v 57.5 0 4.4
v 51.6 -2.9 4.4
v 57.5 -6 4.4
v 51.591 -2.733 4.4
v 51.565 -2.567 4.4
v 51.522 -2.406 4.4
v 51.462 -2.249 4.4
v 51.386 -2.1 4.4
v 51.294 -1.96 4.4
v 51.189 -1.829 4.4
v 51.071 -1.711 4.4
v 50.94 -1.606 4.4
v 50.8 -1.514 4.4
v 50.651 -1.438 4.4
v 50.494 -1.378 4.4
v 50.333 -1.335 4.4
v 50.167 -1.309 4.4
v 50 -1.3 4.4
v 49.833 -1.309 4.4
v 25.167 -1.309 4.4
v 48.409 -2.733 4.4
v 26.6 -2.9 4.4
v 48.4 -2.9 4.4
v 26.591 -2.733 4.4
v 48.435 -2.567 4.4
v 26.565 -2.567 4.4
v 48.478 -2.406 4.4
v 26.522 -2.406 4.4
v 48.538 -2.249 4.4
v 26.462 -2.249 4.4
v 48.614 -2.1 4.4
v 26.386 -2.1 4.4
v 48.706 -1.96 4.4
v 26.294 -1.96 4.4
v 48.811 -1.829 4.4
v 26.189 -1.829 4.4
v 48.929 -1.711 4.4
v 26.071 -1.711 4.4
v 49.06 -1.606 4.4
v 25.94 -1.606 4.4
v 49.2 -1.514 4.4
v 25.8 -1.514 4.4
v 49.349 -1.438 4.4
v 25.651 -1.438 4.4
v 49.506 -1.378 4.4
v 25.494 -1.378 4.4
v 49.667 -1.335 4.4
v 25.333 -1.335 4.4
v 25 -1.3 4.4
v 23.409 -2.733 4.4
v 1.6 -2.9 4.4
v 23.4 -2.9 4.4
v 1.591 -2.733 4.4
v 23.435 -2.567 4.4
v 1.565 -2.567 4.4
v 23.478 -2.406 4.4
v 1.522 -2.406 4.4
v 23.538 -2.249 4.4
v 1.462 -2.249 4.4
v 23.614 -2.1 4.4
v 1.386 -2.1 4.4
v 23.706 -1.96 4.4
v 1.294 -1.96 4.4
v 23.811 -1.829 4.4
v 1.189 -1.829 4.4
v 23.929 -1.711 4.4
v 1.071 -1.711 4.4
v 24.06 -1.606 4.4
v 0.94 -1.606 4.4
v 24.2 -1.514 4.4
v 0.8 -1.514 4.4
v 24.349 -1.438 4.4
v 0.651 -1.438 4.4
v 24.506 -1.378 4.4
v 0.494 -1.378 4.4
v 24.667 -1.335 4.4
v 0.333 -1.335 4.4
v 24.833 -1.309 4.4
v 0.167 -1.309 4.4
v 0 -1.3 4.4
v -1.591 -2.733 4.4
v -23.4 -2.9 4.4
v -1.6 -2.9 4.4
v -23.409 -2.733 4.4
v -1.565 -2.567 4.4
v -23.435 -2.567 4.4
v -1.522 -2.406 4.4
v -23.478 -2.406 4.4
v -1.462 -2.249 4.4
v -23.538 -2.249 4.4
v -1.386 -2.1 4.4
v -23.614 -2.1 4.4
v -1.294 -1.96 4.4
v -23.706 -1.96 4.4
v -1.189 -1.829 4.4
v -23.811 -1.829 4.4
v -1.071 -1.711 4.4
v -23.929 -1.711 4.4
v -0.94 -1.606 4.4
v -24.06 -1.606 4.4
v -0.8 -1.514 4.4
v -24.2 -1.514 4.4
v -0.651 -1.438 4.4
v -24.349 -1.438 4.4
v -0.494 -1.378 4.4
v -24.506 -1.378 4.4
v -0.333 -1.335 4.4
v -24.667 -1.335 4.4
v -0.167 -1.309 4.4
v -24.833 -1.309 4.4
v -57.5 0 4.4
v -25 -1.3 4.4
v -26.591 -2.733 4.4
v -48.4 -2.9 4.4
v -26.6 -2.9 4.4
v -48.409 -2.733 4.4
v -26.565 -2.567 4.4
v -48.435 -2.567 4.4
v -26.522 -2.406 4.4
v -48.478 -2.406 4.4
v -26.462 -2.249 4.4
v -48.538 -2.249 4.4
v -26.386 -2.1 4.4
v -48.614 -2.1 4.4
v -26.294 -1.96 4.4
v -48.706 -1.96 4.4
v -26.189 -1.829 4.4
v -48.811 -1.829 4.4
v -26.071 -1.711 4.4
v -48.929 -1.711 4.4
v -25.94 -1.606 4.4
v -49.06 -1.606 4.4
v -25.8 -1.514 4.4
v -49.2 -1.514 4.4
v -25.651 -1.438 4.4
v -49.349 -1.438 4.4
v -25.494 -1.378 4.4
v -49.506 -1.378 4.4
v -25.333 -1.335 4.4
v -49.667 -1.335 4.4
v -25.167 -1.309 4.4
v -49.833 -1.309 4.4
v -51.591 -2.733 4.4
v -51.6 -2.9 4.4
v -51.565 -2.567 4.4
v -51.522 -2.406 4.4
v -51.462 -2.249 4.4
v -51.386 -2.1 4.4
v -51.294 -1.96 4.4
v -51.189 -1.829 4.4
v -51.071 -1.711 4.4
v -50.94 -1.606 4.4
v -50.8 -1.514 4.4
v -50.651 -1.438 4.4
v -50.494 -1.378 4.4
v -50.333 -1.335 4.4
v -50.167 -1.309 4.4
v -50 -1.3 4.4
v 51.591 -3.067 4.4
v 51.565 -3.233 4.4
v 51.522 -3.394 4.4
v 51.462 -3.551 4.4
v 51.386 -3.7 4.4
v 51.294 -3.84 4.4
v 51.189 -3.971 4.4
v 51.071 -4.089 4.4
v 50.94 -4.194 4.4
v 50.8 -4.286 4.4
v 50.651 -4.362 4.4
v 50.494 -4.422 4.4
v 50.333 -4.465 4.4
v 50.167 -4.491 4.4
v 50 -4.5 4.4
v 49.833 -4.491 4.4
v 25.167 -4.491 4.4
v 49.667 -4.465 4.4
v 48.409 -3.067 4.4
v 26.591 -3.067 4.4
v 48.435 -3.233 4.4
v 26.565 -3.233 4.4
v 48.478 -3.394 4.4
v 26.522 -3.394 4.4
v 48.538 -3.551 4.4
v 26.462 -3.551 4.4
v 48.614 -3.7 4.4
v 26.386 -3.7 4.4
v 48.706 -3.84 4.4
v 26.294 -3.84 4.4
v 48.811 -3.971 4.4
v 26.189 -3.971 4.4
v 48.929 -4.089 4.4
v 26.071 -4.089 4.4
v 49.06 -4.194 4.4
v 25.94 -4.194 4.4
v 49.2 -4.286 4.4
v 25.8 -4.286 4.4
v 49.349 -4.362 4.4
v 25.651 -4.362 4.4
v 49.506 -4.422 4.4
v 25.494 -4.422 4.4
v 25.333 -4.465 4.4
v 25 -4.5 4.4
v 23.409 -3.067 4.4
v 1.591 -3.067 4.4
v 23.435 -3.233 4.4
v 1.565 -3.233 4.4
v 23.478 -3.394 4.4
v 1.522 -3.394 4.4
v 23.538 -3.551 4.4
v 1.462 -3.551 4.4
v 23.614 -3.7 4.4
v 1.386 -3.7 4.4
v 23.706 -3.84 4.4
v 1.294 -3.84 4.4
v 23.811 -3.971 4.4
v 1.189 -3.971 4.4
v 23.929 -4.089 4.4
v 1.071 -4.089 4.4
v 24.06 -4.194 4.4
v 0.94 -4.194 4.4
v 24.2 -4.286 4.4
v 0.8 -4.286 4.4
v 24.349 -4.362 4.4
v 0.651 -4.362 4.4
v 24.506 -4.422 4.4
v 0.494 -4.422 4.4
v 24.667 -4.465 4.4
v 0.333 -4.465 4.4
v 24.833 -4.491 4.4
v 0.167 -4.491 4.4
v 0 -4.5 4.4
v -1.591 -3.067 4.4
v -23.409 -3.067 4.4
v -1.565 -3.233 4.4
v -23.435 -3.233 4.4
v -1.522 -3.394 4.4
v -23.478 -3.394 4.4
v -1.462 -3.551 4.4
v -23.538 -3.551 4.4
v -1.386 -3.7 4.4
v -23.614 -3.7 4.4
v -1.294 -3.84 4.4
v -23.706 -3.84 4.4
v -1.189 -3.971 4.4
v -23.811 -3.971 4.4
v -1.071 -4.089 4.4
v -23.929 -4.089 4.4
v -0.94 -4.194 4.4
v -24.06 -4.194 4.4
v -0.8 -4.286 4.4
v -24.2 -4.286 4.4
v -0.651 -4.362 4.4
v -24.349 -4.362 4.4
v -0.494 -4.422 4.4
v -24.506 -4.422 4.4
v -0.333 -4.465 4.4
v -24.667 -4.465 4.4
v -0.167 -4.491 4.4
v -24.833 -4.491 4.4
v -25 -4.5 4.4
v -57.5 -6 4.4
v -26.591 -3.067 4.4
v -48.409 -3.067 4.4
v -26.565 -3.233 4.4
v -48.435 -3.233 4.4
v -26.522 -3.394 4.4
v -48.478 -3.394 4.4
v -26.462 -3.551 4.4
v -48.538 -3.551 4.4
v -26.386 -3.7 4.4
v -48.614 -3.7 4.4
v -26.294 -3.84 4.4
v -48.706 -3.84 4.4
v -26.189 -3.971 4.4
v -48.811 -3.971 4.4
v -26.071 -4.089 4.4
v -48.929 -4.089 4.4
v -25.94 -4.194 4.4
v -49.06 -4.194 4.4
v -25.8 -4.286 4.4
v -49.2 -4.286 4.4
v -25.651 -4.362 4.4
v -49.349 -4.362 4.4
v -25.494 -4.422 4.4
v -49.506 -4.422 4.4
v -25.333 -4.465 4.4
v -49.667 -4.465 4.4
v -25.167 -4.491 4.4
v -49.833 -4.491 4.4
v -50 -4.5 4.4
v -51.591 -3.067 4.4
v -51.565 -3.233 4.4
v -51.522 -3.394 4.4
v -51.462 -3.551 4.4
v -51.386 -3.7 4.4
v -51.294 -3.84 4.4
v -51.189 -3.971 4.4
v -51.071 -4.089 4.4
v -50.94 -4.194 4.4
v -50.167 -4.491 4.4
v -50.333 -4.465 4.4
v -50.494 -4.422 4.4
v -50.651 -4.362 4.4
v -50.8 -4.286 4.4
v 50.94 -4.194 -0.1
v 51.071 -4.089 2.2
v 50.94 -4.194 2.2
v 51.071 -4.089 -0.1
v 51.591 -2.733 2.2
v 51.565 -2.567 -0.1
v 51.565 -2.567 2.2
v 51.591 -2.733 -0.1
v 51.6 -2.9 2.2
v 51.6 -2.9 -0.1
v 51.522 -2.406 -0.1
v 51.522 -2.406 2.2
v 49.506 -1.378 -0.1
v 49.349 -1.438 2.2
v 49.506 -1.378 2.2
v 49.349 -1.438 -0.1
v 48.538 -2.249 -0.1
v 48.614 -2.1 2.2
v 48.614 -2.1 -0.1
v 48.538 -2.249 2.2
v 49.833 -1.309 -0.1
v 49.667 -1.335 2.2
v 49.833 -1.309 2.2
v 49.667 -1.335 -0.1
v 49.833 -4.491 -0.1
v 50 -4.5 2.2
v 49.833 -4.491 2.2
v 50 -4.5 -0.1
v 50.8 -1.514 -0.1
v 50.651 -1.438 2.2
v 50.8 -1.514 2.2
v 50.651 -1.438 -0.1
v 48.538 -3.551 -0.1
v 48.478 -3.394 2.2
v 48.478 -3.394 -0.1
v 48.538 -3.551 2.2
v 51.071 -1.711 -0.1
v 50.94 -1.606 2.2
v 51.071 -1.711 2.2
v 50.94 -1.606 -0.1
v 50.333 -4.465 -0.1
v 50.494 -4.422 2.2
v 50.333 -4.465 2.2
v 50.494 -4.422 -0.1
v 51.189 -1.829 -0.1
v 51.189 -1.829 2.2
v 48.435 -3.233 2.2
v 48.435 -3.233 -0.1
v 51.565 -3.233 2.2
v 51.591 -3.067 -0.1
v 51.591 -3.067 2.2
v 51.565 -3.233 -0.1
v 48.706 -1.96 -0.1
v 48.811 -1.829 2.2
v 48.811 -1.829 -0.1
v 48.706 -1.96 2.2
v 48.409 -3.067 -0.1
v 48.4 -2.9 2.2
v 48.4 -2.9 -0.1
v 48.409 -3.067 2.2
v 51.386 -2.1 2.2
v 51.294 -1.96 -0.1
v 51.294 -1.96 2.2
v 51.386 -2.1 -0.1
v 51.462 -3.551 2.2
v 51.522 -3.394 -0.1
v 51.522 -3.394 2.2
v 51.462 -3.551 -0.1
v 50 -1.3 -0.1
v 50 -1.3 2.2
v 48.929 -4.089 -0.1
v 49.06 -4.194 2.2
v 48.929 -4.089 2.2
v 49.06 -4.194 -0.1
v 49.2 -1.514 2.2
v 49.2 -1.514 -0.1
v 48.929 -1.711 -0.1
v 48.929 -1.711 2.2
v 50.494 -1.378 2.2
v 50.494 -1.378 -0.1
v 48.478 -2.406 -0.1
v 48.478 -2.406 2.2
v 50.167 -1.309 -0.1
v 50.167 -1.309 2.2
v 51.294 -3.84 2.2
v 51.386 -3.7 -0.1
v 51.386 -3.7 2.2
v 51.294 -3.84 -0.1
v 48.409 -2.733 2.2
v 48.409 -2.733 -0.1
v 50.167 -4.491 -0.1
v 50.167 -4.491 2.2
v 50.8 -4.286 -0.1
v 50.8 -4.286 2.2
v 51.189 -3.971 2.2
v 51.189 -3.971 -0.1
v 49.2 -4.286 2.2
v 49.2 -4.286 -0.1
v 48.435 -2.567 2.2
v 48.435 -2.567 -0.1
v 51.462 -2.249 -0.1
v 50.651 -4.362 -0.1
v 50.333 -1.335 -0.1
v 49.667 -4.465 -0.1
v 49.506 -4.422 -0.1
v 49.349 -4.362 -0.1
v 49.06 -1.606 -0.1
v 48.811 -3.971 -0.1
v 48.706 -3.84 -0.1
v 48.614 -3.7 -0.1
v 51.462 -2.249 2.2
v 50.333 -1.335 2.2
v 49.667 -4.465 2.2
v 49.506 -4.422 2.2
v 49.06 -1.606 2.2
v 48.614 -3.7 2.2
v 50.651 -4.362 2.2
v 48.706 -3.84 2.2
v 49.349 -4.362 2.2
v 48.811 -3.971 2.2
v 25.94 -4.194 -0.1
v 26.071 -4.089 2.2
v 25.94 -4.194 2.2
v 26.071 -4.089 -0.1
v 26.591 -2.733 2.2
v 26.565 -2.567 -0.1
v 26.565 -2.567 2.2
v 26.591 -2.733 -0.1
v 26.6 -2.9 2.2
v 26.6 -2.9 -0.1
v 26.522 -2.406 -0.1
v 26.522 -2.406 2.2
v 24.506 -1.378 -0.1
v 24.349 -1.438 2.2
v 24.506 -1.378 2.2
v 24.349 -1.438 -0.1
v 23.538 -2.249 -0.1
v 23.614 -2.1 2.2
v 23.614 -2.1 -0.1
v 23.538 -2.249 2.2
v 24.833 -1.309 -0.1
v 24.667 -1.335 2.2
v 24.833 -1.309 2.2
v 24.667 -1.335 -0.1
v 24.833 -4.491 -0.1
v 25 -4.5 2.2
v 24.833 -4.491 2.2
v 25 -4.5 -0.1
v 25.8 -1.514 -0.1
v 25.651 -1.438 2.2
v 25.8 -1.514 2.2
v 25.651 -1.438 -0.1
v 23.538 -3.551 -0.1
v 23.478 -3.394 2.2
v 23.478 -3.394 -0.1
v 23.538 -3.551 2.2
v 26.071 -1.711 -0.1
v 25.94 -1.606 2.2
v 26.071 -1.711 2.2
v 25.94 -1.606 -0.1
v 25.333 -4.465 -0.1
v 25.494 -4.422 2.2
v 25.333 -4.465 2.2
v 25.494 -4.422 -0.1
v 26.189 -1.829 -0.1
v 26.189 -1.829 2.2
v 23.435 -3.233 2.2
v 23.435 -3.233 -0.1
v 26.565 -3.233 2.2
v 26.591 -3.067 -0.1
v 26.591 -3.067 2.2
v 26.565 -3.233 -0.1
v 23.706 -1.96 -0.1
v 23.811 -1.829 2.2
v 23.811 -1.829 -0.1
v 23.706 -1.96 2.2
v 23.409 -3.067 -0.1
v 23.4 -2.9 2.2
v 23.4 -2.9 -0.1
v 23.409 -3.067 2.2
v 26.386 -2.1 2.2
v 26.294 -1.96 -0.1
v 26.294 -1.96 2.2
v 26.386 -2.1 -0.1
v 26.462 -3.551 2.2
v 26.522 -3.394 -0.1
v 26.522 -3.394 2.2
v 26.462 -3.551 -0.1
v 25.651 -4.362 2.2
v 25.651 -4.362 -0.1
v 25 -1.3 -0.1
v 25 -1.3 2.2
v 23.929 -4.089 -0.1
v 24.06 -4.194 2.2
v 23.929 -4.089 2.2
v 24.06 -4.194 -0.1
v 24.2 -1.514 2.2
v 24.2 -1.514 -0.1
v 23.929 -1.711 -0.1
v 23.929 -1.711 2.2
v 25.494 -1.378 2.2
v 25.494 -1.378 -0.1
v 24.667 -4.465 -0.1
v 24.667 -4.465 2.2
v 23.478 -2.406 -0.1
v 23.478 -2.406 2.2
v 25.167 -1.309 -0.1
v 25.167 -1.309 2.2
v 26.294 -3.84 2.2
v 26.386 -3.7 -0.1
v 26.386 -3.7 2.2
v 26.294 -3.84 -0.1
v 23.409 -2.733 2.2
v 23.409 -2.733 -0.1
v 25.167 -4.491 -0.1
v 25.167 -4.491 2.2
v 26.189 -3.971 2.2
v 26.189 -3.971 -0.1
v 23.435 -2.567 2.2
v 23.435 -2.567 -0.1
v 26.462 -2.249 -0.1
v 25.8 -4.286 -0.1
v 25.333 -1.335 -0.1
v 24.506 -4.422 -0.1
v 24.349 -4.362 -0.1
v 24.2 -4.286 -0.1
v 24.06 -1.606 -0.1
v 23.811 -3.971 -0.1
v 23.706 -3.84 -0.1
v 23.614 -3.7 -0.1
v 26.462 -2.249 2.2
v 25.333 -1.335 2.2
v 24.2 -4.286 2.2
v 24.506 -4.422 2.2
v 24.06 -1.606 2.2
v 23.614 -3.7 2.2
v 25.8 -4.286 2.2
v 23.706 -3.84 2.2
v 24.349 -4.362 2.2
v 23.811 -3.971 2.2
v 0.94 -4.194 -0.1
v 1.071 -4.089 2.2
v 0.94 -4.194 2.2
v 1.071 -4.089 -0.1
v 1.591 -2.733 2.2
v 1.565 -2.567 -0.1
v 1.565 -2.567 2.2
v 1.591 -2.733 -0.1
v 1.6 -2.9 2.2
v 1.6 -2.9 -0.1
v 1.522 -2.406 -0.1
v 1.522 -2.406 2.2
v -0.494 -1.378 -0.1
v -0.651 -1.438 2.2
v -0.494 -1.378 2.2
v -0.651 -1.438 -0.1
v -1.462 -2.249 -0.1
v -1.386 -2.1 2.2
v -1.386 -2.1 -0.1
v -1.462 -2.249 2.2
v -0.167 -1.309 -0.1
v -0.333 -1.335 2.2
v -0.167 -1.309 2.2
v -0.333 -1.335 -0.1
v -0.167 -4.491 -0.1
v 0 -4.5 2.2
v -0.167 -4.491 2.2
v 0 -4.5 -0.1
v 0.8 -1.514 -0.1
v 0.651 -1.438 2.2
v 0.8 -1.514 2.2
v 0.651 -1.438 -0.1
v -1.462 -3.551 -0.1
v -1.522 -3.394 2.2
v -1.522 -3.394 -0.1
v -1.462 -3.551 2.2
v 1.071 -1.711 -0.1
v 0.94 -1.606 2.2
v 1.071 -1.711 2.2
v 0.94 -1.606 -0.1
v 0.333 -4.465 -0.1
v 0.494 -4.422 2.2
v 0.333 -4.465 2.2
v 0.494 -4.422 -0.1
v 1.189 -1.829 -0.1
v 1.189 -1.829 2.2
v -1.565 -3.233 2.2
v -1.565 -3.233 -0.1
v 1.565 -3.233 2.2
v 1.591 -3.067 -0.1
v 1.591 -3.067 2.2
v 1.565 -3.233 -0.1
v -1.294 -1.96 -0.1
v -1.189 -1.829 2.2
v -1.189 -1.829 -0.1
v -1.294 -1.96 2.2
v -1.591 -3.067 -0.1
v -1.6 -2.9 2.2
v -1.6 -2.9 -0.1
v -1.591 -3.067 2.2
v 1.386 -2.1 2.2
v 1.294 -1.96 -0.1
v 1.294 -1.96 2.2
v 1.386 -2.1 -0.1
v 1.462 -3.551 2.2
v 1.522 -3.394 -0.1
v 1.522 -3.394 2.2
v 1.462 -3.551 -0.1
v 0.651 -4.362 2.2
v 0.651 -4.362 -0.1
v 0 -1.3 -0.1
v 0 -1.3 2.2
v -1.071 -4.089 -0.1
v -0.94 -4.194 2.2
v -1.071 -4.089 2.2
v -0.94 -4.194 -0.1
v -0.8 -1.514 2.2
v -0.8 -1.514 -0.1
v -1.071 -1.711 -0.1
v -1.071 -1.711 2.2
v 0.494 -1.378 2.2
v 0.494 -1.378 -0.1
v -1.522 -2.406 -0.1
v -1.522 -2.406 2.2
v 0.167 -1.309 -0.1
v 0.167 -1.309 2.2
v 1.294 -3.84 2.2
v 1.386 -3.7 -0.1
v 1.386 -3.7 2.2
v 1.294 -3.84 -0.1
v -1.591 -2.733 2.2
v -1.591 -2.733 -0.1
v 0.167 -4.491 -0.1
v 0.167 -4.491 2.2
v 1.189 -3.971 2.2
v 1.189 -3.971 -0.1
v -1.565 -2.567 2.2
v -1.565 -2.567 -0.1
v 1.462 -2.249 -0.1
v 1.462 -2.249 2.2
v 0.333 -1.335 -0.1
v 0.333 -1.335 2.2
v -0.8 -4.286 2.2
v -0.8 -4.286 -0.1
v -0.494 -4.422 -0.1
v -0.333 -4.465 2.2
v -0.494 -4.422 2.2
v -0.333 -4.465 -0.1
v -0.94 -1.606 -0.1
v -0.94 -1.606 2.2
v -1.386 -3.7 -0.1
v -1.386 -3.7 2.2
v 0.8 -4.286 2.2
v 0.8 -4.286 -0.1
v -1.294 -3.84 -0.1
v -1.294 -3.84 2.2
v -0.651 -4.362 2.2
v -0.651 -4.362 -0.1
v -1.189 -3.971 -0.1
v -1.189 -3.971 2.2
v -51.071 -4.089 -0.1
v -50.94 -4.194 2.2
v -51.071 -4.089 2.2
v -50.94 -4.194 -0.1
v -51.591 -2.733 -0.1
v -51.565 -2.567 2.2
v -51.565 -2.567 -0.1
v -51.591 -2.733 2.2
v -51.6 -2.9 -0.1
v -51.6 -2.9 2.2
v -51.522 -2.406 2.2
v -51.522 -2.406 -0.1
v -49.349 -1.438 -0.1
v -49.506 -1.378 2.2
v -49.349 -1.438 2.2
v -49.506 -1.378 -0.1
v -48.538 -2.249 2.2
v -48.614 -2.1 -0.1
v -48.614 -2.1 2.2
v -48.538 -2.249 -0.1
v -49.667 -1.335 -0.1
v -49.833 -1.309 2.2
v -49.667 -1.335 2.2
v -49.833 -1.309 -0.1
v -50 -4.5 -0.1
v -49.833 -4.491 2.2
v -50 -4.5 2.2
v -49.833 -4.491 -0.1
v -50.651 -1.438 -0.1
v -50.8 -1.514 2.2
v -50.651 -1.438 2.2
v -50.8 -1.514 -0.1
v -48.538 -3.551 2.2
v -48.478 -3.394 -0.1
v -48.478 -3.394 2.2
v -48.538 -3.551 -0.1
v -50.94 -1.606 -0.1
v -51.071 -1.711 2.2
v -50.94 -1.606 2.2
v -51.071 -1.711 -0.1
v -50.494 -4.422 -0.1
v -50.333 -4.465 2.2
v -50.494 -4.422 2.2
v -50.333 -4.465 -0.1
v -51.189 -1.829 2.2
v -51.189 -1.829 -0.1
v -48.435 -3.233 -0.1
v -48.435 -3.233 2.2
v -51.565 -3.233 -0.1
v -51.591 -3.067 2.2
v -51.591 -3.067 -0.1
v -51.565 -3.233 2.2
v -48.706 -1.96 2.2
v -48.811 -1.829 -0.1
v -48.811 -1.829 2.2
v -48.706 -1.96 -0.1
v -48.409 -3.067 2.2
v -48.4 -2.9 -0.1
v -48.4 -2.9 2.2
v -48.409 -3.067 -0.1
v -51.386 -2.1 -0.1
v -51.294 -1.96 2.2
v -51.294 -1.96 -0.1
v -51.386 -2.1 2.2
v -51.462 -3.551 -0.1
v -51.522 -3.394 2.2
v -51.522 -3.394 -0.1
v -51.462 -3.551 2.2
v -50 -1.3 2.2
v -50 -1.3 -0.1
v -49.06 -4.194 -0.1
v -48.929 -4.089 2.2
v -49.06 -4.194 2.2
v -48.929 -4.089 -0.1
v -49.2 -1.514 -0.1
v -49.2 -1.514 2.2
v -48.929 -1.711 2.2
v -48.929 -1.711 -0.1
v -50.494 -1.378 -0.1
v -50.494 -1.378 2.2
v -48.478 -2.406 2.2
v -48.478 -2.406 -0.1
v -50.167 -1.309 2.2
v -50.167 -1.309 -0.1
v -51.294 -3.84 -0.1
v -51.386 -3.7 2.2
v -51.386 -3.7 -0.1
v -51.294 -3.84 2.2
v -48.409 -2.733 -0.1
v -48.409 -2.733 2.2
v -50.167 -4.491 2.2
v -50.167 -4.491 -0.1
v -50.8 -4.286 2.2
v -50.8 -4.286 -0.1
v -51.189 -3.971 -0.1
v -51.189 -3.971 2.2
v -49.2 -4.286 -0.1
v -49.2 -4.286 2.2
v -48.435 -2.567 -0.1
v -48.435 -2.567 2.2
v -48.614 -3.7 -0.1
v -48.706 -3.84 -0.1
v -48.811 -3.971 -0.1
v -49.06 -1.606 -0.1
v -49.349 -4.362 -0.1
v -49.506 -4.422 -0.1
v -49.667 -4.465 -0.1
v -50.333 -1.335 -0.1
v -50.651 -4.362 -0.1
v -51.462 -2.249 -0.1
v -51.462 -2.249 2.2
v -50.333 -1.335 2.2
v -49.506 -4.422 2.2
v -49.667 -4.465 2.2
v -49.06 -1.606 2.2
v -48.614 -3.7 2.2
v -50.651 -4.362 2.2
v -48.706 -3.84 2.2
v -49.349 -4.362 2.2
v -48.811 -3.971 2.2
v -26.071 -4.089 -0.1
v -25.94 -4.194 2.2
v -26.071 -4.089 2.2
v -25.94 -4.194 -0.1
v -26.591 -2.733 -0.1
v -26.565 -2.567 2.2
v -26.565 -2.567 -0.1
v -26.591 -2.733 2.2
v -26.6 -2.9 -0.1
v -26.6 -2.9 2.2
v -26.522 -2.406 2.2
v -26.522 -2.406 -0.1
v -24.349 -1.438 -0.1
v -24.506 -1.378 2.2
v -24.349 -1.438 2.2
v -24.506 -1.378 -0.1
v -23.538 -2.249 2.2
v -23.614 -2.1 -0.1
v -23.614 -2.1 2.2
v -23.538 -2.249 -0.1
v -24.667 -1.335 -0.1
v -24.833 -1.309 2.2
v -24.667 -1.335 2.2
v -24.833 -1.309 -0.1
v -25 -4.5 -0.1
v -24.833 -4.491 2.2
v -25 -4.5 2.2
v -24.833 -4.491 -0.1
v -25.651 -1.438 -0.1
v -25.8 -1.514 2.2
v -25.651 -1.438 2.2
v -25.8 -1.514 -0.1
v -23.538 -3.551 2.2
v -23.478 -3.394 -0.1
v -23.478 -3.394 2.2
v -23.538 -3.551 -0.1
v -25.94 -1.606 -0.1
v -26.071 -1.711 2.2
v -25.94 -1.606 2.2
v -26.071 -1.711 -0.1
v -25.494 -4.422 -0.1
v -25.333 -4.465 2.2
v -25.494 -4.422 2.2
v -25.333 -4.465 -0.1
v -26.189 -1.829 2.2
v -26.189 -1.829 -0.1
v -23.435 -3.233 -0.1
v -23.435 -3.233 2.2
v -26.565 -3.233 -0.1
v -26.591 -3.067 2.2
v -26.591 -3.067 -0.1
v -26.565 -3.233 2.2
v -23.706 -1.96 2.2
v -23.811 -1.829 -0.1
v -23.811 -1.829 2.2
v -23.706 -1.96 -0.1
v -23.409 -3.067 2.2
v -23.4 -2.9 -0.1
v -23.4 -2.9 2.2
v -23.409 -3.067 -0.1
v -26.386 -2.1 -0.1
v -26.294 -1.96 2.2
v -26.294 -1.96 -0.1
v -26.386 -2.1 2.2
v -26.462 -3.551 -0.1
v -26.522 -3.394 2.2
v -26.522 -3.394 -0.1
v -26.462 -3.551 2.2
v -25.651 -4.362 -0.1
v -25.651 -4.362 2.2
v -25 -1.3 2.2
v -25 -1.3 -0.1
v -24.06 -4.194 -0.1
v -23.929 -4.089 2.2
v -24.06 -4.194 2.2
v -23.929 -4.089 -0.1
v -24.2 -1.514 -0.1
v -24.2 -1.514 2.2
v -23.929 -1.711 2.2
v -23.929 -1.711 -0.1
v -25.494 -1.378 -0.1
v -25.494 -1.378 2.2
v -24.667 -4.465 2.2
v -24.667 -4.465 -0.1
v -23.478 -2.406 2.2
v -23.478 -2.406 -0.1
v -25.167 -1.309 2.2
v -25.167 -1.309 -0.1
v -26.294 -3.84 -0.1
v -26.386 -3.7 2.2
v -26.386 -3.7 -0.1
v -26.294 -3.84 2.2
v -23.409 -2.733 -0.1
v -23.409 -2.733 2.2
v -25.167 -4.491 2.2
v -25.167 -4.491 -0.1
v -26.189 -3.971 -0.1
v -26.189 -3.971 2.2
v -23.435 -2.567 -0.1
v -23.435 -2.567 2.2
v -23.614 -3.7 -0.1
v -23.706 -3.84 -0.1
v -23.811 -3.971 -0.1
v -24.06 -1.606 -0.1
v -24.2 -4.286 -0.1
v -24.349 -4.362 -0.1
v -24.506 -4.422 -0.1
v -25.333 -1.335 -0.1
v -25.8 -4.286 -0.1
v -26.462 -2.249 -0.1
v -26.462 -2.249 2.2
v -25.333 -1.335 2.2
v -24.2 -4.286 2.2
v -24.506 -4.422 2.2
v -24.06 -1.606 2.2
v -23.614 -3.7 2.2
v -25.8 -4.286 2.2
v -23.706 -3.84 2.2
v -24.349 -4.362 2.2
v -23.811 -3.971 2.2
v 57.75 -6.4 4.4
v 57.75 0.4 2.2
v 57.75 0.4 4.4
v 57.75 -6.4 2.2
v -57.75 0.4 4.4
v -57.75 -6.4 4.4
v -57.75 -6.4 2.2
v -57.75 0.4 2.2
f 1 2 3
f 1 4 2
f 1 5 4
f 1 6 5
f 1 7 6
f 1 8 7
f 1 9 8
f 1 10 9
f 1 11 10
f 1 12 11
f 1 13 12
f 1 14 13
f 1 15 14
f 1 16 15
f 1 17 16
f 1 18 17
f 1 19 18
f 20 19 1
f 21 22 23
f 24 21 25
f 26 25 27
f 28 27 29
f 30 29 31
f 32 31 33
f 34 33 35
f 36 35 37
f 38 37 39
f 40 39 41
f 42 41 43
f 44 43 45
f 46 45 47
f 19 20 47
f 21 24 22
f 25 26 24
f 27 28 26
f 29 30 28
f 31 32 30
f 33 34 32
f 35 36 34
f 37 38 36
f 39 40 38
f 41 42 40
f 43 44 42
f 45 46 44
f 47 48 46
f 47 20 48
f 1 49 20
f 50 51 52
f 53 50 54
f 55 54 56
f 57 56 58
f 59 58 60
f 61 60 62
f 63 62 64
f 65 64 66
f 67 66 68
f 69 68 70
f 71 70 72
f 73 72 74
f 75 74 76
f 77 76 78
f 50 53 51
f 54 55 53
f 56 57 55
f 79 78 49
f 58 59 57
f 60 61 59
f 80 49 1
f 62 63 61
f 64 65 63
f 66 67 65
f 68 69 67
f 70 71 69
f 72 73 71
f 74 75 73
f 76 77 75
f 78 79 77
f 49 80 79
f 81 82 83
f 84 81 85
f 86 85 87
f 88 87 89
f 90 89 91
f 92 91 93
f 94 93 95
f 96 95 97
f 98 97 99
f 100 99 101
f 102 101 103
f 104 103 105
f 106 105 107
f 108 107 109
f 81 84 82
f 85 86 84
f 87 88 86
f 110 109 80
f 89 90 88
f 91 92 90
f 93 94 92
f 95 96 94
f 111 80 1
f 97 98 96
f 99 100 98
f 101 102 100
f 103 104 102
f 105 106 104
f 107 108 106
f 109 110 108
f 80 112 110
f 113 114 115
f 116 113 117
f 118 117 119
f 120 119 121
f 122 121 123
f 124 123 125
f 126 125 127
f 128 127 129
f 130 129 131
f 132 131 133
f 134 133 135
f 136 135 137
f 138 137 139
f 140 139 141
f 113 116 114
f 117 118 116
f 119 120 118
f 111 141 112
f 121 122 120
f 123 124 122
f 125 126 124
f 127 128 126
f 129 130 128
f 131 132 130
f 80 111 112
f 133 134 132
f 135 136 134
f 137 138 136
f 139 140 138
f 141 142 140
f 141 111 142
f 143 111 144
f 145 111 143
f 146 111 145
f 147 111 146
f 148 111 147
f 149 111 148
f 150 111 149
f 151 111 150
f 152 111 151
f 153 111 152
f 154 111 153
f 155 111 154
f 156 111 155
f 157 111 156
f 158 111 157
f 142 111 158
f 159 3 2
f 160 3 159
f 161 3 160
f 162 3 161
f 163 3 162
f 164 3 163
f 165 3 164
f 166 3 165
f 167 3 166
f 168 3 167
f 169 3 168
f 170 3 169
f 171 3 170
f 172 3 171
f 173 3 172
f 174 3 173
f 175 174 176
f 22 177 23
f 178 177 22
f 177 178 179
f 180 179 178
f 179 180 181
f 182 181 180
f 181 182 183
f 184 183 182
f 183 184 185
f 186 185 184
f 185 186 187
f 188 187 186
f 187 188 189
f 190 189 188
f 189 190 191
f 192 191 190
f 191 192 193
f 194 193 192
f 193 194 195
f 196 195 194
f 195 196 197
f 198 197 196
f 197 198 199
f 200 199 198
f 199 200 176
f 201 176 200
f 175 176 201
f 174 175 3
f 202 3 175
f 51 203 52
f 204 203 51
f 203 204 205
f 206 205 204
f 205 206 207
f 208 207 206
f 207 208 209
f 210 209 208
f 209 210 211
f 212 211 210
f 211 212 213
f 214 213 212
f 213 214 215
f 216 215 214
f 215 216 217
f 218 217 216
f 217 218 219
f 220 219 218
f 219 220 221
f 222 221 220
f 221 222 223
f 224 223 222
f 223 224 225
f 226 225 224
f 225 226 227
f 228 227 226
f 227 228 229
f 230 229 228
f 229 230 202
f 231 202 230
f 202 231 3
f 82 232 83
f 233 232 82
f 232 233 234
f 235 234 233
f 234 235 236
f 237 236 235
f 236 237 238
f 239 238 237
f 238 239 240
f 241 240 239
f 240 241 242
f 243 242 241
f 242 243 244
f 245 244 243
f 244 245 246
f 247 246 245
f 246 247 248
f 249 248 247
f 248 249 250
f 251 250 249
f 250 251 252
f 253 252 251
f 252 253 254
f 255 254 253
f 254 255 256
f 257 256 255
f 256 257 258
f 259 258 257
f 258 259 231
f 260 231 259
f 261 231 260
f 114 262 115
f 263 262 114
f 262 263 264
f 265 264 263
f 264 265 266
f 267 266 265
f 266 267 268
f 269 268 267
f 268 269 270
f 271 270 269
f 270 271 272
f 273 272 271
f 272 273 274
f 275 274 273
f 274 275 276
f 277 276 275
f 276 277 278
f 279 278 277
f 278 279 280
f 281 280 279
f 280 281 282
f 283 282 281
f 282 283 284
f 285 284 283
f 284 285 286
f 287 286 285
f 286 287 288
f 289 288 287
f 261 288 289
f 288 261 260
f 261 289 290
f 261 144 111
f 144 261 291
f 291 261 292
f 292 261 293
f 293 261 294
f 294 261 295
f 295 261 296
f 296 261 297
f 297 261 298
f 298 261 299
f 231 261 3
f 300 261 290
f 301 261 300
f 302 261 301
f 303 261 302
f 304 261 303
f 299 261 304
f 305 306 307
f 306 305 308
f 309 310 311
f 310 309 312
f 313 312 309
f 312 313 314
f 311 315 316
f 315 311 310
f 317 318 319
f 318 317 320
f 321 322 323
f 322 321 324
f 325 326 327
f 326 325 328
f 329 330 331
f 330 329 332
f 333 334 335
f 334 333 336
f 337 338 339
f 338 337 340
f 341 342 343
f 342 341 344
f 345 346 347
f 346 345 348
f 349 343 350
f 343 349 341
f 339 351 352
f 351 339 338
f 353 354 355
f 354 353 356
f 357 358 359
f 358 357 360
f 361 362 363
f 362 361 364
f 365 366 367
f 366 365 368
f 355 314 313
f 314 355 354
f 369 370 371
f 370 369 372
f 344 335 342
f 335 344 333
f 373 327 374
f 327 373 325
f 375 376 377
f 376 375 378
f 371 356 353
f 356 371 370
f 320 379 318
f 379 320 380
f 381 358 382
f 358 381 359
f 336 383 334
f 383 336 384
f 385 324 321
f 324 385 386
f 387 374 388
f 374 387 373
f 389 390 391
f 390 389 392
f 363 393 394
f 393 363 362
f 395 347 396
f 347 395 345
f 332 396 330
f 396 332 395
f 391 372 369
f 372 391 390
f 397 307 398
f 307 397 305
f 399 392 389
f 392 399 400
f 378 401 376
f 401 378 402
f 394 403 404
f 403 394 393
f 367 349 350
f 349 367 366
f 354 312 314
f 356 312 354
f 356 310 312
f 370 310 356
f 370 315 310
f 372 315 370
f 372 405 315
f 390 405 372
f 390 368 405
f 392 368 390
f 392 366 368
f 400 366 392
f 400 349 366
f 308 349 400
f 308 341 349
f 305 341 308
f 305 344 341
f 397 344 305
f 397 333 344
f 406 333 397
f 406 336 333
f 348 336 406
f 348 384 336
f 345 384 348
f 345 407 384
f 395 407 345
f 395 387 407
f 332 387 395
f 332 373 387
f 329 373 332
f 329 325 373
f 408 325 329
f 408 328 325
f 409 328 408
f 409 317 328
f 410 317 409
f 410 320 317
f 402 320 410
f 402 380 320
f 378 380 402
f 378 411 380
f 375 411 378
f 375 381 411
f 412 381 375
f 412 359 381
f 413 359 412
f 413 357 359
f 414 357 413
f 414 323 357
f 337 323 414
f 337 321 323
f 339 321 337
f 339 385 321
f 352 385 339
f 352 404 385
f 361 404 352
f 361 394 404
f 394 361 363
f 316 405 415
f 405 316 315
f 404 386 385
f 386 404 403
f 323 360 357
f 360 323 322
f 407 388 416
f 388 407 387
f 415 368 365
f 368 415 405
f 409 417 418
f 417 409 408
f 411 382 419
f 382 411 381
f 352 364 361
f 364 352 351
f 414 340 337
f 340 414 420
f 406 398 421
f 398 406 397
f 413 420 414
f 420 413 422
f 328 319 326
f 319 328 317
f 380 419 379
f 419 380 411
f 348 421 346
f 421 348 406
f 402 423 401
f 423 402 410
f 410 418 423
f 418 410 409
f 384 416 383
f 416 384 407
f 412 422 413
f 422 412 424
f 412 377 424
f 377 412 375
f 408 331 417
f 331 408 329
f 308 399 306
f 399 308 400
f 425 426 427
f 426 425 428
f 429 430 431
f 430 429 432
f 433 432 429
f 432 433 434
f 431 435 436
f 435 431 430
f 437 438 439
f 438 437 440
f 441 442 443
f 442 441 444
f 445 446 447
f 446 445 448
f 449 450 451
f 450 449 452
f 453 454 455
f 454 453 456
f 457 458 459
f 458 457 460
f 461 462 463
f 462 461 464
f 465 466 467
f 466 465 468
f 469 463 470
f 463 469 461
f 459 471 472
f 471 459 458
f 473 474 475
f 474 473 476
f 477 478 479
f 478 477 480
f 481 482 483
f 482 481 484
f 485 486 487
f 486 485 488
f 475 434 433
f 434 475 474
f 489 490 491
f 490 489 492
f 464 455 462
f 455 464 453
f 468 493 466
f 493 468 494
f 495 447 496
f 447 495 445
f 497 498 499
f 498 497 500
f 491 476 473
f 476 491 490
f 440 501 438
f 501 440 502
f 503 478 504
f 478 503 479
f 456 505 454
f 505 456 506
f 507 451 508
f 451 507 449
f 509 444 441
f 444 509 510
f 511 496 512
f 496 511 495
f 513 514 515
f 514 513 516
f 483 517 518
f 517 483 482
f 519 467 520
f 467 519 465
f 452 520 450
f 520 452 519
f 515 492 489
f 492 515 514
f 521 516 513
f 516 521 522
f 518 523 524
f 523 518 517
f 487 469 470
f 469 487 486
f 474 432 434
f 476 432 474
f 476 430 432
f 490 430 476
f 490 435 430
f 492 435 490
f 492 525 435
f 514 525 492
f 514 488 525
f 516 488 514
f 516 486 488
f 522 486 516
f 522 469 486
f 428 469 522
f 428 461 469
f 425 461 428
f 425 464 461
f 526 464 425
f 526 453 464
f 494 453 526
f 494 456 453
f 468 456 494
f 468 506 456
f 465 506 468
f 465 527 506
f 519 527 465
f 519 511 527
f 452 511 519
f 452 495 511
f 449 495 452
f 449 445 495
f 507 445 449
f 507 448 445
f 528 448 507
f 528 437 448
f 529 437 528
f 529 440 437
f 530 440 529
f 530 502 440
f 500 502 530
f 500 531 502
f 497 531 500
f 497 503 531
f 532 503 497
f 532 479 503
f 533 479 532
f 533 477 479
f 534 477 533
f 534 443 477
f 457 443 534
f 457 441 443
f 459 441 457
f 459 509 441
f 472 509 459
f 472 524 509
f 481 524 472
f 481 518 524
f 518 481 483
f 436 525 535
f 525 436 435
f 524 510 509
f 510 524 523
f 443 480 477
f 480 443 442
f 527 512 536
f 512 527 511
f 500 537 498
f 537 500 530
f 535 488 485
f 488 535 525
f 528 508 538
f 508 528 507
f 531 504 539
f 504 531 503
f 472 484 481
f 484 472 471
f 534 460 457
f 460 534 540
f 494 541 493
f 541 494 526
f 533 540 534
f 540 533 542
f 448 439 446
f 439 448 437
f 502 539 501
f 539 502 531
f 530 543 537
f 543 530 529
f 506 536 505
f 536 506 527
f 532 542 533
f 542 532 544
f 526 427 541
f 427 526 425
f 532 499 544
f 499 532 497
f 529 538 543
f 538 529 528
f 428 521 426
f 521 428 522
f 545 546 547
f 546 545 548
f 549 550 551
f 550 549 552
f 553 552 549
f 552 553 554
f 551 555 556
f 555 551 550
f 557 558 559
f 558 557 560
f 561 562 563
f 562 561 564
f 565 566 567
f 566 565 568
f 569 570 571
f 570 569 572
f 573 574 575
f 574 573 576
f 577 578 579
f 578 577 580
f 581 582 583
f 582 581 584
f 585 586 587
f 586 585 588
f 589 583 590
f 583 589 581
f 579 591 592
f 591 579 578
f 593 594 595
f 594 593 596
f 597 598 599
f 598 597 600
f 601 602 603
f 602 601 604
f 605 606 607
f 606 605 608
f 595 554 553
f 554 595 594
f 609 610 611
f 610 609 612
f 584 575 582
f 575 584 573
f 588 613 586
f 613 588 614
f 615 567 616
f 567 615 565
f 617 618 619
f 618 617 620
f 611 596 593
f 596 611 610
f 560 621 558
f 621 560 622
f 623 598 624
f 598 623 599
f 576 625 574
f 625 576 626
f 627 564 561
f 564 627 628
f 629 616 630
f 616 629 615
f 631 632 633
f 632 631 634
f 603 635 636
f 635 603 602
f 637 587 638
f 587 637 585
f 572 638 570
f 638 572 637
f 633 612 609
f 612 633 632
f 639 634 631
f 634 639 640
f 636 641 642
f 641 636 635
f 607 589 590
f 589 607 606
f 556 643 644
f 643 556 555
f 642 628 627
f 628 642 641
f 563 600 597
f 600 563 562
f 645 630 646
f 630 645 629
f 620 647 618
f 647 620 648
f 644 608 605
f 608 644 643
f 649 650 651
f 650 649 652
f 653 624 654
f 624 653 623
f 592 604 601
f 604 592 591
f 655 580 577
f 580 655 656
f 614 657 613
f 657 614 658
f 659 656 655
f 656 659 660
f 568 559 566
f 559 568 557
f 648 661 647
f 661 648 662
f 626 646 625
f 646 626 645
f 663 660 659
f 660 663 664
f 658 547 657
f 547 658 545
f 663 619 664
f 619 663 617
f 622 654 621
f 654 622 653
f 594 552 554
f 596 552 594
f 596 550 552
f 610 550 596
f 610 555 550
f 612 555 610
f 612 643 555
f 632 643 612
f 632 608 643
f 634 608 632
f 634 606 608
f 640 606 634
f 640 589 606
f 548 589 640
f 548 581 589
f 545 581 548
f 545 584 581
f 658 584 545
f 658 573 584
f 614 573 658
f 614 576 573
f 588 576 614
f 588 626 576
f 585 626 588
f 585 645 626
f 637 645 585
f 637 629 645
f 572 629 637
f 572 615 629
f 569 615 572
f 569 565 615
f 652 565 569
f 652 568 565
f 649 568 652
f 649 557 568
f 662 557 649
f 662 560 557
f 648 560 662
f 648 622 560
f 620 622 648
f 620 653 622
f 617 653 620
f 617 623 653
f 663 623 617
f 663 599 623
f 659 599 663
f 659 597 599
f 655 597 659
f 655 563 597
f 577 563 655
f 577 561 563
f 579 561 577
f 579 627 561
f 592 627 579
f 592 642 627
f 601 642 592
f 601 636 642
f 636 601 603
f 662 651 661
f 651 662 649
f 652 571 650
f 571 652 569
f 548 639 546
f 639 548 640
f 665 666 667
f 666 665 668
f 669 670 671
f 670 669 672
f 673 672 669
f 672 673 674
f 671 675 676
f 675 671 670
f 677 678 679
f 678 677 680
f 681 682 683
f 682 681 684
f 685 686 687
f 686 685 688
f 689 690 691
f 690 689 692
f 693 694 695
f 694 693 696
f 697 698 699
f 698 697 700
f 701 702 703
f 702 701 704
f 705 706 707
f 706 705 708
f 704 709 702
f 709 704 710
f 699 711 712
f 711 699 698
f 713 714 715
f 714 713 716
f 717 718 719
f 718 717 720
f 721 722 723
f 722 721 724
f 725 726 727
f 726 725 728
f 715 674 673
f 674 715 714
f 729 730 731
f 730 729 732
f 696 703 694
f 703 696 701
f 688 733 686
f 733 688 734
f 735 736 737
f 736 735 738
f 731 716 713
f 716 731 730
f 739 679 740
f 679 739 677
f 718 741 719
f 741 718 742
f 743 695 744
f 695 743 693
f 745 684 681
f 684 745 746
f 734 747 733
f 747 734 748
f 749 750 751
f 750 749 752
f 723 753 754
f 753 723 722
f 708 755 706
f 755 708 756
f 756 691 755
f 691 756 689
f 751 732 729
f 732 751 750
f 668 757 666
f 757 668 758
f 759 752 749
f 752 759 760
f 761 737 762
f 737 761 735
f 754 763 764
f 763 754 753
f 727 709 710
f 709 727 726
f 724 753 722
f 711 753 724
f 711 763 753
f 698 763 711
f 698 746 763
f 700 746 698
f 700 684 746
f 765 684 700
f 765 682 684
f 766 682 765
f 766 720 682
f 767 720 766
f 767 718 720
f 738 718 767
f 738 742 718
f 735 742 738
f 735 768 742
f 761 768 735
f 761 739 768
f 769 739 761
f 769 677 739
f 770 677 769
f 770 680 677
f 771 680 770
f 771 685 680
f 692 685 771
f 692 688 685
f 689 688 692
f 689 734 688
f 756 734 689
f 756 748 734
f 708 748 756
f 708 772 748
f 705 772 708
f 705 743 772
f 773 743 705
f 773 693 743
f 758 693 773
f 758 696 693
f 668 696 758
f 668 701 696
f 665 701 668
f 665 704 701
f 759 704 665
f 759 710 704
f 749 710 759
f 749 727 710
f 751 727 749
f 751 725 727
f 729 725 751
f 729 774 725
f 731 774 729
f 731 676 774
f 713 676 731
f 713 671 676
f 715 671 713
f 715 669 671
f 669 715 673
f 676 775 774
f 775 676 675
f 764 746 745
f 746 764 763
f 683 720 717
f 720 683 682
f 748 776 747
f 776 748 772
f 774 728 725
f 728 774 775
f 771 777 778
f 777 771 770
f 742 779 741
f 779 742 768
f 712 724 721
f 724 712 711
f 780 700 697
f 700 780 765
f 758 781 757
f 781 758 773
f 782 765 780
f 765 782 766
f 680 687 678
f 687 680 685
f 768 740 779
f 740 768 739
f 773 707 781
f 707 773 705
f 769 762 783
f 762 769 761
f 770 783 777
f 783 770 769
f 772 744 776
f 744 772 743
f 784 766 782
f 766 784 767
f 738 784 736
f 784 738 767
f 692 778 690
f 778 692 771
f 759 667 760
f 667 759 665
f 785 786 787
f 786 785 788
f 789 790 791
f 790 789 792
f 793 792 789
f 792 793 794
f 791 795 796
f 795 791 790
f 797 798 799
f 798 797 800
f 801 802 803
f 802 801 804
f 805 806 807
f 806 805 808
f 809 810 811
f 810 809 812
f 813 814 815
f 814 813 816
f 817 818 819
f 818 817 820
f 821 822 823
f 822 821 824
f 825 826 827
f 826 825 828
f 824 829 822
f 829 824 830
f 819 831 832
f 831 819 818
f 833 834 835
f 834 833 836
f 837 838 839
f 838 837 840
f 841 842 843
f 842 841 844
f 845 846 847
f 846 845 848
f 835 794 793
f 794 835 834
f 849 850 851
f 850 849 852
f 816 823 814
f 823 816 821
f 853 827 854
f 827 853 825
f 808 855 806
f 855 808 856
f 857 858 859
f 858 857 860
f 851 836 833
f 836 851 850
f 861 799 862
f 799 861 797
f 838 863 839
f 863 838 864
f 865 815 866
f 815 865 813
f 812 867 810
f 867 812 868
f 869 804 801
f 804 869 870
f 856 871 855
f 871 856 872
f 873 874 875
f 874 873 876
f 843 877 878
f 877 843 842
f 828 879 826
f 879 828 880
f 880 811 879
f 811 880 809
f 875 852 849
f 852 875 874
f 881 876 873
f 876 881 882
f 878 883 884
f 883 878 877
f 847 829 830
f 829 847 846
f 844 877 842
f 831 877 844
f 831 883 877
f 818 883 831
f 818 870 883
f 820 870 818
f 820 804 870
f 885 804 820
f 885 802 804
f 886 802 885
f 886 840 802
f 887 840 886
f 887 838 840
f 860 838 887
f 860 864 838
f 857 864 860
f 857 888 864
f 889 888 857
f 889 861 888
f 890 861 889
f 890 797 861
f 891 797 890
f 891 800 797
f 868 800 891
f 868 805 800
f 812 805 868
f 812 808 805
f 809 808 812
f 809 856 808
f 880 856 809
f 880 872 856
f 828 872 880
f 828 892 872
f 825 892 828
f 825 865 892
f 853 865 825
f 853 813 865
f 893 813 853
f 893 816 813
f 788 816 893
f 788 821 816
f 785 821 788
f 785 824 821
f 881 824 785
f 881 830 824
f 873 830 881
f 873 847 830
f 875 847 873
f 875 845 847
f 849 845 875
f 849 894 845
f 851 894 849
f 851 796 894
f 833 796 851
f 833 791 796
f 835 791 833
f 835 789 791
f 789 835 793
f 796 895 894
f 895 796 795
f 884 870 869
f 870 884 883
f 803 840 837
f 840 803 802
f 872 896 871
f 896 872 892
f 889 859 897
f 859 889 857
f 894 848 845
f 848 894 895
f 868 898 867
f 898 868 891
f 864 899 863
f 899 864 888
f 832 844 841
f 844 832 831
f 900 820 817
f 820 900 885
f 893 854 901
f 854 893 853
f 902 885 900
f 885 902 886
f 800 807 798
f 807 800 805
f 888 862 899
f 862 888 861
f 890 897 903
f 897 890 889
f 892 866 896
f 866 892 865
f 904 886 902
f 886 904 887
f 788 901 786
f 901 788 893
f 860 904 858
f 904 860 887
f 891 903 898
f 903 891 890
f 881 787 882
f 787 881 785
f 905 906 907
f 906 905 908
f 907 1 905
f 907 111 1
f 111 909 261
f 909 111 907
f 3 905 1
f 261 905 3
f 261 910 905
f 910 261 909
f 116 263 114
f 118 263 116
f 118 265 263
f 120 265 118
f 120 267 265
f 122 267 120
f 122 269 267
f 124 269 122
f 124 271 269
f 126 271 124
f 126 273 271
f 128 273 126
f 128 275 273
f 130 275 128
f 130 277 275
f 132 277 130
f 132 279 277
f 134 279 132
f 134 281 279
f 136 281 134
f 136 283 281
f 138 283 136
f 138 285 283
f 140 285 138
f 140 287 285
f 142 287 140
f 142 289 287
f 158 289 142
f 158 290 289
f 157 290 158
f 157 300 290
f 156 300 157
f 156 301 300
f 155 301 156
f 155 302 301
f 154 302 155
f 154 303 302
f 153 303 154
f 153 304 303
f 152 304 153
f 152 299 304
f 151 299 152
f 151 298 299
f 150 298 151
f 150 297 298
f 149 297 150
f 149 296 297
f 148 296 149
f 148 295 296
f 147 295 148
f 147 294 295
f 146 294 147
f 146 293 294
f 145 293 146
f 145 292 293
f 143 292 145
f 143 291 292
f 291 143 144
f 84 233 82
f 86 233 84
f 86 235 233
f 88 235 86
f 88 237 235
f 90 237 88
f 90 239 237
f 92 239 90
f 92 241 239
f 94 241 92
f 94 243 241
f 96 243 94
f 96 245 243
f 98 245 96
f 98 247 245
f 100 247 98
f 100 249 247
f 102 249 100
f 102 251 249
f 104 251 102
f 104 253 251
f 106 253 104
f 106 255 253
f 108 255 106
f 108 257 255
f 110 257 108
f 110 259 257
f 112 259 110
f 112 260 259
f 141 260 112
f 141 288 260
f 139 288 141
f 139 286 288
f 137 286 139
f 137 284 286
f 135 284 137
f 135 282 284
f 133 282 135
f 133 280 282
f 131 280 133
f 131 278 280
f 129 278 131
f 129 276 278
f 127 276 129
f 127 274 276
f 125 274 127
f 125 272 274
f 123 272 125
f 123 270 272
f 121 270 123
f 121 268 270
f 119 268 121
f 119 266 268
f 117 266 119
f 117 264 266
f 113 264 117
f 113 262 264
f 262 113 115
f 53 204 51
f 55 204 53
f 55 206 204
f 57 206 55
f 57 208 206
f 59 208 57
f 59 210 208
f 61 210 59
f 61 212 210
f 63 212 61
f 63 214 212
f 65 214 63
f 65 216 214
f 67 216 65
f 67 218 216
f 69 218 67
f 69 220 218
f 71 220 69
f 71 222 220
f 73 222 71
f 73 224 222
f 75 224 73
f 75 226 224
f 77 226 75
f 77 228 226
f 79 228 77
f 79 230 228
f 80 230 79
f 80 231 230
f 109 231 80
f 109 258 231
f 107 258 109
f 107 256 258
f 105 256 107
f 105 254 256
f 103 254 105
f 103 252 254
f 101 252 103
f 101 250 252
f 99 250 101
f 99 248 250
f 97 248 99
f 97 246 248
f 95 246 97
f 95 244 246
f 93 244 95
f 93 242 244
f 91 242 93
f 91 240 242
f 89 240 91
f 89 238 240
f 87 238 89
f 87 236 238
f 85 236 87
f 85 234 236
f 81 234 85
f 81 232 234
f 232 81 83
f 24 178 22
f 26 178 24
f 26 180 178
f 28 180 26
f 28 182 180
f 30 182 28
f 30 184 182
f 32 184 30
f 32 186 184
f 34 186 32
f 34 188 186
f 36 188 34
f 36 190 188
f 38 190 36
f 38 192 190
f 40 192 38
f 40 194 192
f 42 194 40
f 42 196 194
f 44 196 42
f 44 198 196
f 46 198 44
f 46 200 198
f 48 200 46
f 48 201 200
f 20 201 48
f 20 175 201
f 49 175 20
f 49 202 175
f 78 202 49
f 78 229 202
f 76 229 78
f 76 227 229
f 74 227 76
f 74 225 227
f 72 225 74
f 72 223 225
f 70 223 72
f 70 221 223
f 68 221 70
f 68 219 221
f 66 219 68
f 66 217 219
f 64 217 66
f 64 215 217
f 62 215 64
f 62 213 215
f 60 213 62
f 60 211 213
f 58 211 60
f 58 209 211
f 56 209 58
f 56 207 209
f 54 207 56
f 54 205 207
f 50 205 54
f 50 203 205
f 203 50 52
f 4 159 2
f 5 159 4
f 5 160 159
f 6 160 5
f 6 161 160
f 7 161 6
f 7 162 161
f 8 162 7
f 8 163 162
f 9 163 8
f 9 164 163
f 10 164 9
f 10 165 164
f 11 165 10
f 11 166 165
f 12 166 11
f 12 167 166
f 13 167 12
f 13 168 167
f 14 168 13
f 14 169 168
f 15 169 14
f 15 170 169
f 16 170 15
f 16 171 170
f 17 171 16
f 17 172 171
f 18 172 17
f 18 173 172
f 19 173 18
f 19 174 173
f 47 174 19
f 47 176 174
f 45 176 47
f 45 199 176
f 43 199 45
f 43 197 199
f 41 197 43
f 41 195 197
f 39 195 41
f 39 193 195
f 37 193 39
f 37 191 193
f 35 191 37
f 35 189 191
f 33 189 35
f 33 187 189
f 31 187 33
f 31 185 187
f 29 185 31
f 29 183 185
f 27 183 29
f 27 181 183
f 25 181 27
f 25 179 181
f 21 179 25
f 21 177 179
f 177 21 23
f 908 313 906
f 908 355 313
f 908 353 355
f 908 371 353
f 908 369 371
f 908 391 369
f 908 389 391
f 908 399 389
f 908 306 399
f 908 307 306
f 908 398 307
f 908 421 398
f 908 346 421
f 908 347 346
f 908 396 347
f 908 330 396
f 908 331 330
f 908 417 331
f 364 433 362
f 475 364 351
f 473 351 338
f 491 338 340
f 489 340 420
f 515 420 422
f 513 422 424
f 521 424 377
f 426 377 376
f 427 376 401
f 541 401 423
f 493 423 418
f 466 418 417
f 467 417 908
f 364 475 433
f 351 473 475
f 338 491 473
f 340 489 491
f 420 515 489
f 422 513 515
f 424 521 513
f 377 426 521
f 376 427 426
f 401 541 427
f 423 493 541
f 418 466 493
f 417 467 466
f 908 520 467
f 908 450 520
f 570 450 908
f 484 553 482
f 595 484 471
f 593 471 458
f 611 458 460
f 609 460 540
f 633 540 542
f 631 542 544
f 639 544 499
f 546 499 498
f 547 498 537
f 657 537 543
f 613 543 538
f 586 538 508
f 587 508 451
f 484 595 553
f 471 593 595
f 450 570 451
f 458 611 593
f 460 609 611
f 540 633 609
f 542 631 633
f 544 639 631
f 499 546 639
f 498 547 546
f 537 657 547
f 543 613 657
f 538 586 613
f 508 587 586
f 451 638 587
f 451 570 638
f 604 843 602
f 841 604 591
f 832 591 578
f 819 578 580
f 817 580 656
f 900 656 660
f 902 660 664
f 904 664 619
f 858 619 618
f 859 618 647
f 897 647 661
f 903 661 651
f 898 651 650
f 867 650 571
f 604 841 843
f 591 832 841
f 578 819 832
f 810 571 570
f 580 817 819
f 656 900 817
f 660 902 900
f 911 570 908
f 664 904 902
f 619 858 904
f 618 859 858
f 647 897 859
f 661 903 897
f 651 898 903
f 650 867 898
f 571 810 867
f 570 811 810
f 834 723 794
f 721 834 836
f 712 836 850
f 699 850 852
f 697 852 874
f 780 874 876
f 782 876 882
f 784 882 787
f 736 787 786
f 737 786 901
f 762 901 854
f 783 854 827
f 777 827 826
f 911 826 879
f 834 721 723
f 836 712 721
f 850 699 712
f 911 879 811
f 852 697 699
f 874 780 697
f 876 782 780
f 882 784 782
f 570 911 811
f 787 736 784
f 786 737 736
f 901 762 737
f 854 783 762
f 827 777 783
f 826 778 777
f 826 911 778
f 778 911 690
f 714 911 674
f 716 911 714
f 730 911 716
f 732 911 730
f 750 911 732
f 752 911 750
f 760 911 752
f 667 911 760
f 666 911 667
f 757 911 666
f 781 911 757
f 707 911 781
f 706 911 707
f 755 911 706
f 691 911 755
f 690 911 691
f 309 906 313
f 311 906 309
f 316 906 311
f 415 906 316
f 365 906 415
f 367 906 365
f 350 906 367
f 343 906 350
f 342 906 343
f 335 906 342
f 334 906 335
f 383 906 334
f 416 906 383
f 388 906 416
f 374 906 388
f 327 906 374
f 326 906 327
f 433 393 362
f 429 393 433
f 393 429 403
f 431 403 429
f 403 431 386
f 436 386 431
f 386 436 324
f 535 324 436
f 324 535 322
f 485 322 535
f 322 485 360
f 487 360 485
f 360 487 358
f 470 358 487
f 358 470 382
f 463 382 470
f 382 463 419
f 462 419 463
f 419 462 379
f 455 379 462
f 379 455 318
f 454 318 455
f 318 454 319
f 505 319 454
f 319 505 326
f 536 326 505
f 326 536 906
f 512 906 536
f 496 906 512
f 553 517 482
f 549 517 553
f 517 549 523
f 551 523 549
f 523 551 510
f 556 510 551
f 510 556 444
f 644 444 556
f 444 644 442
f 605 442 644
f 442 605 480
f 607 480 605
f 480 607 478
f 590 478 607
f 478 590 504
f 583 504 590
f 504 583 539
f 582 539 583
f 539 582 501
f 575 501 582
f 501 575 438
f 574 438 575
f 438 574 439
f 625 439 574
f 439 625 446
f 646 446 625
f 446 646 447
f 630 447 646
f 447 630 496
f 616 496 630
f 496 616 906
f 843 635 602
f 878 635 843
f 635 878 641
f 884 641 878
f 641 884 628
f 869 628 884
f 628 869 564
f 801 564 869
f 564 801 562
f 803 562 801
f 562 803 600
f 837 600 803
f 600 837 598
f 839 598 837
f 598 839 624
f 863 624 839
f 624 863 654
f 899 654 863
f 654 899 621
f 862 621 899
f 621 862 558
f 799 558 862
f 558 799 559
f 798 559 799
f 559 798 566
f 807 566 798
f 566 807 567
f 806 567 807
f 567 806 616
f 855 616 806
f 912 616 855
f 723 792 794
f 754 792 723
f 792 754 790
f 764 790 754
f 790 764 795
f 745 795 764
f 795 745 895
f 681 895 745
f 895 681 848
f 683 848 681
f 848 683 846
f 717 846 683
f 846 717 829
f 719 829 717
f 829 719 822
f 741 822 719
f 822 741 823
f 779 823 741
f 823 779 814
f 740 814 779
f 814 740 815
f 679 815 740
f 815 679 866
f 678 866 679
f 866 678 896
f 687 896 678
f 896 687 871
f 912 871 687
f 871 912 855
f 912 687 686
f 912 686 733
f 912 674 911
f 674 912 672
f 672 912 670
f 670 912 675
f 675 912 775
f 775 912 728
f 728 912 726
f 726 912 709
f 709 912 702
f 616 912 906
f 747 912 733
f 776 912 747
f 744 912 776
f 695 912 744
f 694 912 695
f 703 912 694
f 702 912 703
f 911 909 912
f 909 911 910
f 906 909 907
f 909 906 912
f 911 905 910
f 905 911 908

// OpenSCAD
/**
 * Module: Connectors and slot for connector.
 *
 * Author: Karim Aziiev <karim.aziiev@gmail.com>
 * License: GPL-3.0-or-later
 */

include <../../colors.scad>
include <../../parameters.scad>

use <../../lib/functions.scad>
use <../../lib/holes.scad>
use <../../lib/shapes2d.scad>
use <../../lib/shapes3d.scad>
use <../../lib/slots.scad>
use<../../lib/transforms.scad>



module  chassis_connector_tongue() {
  translate([0, 0, chassis_connector_height]) {
    translate([0, -chassis_connector_len / 2, 0]) {
      difference() {
        cuboid(size=[chassis_connector_w,
                      chassis_connector_len,
                      chassis_connector_height]);
        mirror_copy([1, 0, 0]) {
          for (x = chassis_connector_bolt_positions) {
            translate([x,
                       -chassis_connector_len / 2 + chassis_connector_dia / 2
                       + chassis_connector_edge_distance,
                       0]) {
              counterbore(d=chassis_connector_dia,
                          h=chassis_connector_height,
                          bore_h=0,
                          bore_d=0,
                          reverse=false,
                          sink=true);
            }
          }
        }
      }
    }
  }
}

module chassis_connector_groove() {
  let (out_clearance = 0.4,
       length = chassis_connector_len + chassis_connector_len_clearance
       + out_clearance) {
    translate([0, -length / 2 + out_clearance, chassis_connector_height]) {
      cuboid(size=[chassis_connector_w + chassis_connector_w_clearance,
                    length,
                    chassis_connector_height]);
    }
  }

  mirror_copy([1, 0, 0]) {
    for (x = chassis_connector_bolt_positions) {
      translate([x,
                 -chassis_connector_len + chassis_connector_dia / 2
                 + chassis_connector_edge_distance,
                 0]) {
        counterbore(d=chassis_connector_dia,
                    h=chassis_thickness,
                    bore_h=0,
                    bore_d=0,
                    reverse=false,
                    sink=true);
      }
    }
  }
}

chassis_connector_tongue();
chassis_connector_groove();
